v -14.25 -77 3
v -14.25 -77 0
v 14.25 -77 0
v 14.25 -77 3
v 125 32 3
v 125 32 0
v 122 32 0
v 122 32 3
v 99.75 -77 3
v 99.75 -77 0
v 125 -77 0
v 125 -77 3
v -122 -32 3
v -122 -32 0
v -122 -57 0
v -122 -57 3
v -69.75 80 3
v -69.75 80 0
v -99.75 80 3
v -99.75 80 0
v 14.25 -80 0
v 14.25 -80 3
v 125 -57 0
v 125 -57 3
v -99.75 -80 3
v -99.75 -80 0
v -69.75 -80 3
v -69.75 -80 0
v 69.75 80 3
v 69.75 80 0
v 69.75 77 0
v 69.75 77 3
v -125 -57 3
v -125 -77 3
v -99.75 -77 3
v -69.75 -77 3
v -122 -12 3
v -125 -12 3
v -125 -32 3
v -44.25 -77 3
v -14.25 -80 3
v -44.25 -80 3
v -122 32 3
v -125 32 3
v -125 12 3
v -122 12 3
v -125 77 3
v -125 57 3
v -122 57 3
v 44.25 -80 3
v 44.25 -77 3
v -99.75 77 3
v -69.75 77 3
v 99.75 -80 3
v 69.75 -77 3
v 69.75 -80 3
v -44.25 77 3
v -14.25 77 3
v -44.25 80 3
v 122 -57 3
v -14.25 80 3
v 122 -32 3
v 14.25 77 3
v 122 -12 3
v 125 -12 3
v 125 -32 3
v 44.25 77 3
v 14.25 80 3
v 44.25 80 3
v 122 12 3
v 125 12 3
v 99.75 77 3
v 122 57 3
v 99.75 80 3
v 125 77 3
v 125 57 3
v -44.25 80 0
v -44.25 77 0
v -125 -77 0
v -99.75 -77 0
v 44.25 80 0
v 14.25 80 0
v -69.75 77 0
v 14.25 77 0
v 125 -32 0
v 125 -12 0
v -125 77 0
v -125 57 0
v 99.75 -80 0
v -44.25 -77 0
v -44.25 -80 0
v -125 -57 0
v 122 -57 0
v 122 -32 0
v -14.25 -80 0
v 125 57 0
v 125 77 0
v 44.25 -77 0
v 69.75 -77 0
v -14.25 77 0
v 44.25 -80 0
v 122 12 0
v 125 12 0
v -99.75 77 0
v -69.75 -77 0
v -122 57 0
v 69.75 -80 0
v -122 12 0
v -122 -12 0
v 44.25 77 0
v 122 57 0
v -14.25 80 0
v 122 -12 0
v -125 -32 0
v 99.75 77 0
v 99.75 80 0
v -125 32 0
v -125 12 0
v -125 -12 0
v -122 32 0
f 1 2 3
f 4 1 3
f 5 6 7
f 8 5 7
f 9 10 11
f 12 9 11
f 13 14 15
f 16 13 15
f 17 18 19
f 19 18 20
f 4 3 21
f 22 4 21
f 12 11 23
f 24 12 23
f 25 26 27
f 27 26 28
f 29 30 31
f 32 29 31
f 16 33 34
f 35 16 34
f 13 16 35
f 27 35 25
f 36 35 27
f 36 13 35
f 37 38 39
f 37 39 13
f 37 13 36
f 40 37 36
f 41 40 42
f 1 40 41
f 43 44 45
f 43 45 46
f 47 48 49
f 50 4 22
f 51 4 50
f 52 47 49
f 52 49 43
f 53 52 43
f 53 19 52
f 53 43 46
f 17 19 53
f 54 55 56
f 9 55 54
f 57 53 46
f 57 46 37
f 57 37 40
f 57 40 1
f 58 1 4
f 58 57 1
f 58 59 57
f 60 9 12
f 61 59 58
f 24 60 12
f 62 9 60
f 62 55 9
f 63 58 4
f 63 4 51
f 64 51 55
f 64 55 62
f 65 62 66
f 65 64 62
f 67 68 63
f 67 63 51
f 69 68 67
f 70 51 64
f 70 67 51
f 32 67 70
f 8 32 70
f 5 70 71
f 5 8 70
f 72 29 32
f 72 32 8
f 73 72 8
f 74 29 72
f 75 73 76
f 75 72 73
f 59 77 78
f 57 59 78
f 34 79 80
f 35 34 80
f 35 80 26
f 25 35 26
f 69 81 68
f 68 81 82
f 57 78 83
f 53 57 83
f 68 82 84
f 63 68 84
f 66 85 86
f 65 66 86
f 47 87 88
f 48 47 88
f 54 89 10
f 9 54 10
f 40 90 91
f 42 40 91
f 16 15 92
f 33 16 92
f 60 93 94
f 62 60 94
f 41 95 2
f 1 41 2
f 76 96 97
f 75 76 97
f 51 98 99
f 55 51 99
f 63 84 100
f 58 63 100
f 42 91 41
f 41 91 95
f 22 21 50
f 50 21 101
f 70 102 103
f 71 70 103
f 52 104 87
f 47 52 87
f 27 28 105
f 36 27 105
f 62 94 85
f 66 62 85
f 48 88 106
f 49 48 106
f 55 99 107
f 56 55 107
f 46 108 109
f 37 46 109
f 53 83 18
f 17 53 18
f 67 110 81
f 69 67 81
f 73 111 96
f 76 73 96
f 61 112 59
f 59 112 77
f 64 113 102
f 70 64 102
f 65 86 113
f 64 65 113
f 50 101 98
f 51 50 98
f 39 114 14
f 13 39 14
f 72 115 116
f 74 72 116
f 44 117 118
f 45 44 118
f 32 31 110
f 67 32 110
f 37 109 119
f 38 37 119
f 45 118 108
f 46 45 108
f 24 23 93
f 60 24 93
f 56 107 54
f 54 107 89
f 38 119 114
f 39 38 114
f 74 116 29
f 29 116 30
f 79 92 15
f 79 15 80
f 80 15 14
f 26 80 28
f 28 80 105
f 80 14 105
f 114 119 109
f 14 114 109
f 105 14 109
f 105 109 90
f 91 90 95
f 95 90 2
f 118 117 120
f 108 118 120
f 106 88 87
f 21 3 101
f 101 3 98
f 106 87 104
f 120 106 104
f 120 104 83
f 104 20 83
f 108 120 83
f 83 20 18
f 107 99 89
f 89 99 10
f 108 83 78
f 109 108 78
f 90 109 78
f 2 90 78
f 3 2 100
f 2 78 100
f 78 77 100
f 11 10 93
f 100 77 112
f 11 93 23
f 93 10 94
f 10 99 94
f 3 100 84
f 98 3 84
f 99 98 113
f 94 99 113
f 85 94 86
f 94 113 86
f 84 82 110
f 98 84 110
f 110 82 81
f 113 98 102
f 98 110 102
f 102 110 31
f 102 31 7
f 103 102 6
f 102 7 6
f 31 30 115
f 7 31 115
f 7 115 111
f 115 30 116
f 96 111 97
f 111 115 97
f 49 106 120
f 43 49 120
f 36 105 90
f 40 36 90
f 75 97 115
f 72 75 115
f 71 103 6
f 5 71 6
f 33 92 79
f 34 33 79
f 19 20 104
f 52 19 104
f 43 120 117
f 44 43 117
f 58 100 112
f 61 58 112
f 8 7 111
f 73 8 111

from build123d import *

# Parameters (mm, degrees)
F1_DEPTH = 3


with BuildPart() as f1:
    # F0 (on Top) → F1 (new body)
    with BuildSketch(Plane.XY):
        Polygon((-99.75, -77), (-99.75, -80), (-84.75, -80), (-69.75, -80), (-69.75, -77), (-44.25, -77), (-44.25, -80), (-29.25, -80), (-14.25, -80), (-14.25, -77), (14.25, -77), (14.25, -80), (44.25, -80), (44.25, -77), (69.75, -77), (69.75, -80), (99.75, -80), (99.75, -77), (125, -77), (125, -57), (122, -57), (122, -32), (125, -32), (125, -12), (122, -12), (122, 12), (123.5, 22), (122, 32), (122, 57), (125, 57), (125, 77), (99.75, 77), (99.75, 80), (69.75, 80), (69.75, 77), (44.25, 77), (44.25, 80), (14.25, 80), (14.25, 77), (-14.25, 77), (-14.25, 80), (-44.25, 80), (-44.25, 77), (-69.75, 77), (-69.75, 80), (-99.75, 80), (-99.75, 77), (-125, 77), (-125, 57), (-122, 57), (-122, 32), (-125, 32), (-125, 12), (-122, 12), (-122, -12), (-125, -12), (-125, -32), (-122, -32), (-122, -57), (-125, -57), (-125, -77), align=None)
        Polygon((123.5, 22), (122, 12), (125, 12), align=None)
        Polygon((123.5, 22), (125, 12), (125, 22), align=None)
        Polygon((122, 32), (123.5, 22), (125, 32), align=None)
        Polygon((125, 32), (123.5, 22), (125, 22), align=None)
    extrude(amount=F1_DEPTH)


solid = f1.part
